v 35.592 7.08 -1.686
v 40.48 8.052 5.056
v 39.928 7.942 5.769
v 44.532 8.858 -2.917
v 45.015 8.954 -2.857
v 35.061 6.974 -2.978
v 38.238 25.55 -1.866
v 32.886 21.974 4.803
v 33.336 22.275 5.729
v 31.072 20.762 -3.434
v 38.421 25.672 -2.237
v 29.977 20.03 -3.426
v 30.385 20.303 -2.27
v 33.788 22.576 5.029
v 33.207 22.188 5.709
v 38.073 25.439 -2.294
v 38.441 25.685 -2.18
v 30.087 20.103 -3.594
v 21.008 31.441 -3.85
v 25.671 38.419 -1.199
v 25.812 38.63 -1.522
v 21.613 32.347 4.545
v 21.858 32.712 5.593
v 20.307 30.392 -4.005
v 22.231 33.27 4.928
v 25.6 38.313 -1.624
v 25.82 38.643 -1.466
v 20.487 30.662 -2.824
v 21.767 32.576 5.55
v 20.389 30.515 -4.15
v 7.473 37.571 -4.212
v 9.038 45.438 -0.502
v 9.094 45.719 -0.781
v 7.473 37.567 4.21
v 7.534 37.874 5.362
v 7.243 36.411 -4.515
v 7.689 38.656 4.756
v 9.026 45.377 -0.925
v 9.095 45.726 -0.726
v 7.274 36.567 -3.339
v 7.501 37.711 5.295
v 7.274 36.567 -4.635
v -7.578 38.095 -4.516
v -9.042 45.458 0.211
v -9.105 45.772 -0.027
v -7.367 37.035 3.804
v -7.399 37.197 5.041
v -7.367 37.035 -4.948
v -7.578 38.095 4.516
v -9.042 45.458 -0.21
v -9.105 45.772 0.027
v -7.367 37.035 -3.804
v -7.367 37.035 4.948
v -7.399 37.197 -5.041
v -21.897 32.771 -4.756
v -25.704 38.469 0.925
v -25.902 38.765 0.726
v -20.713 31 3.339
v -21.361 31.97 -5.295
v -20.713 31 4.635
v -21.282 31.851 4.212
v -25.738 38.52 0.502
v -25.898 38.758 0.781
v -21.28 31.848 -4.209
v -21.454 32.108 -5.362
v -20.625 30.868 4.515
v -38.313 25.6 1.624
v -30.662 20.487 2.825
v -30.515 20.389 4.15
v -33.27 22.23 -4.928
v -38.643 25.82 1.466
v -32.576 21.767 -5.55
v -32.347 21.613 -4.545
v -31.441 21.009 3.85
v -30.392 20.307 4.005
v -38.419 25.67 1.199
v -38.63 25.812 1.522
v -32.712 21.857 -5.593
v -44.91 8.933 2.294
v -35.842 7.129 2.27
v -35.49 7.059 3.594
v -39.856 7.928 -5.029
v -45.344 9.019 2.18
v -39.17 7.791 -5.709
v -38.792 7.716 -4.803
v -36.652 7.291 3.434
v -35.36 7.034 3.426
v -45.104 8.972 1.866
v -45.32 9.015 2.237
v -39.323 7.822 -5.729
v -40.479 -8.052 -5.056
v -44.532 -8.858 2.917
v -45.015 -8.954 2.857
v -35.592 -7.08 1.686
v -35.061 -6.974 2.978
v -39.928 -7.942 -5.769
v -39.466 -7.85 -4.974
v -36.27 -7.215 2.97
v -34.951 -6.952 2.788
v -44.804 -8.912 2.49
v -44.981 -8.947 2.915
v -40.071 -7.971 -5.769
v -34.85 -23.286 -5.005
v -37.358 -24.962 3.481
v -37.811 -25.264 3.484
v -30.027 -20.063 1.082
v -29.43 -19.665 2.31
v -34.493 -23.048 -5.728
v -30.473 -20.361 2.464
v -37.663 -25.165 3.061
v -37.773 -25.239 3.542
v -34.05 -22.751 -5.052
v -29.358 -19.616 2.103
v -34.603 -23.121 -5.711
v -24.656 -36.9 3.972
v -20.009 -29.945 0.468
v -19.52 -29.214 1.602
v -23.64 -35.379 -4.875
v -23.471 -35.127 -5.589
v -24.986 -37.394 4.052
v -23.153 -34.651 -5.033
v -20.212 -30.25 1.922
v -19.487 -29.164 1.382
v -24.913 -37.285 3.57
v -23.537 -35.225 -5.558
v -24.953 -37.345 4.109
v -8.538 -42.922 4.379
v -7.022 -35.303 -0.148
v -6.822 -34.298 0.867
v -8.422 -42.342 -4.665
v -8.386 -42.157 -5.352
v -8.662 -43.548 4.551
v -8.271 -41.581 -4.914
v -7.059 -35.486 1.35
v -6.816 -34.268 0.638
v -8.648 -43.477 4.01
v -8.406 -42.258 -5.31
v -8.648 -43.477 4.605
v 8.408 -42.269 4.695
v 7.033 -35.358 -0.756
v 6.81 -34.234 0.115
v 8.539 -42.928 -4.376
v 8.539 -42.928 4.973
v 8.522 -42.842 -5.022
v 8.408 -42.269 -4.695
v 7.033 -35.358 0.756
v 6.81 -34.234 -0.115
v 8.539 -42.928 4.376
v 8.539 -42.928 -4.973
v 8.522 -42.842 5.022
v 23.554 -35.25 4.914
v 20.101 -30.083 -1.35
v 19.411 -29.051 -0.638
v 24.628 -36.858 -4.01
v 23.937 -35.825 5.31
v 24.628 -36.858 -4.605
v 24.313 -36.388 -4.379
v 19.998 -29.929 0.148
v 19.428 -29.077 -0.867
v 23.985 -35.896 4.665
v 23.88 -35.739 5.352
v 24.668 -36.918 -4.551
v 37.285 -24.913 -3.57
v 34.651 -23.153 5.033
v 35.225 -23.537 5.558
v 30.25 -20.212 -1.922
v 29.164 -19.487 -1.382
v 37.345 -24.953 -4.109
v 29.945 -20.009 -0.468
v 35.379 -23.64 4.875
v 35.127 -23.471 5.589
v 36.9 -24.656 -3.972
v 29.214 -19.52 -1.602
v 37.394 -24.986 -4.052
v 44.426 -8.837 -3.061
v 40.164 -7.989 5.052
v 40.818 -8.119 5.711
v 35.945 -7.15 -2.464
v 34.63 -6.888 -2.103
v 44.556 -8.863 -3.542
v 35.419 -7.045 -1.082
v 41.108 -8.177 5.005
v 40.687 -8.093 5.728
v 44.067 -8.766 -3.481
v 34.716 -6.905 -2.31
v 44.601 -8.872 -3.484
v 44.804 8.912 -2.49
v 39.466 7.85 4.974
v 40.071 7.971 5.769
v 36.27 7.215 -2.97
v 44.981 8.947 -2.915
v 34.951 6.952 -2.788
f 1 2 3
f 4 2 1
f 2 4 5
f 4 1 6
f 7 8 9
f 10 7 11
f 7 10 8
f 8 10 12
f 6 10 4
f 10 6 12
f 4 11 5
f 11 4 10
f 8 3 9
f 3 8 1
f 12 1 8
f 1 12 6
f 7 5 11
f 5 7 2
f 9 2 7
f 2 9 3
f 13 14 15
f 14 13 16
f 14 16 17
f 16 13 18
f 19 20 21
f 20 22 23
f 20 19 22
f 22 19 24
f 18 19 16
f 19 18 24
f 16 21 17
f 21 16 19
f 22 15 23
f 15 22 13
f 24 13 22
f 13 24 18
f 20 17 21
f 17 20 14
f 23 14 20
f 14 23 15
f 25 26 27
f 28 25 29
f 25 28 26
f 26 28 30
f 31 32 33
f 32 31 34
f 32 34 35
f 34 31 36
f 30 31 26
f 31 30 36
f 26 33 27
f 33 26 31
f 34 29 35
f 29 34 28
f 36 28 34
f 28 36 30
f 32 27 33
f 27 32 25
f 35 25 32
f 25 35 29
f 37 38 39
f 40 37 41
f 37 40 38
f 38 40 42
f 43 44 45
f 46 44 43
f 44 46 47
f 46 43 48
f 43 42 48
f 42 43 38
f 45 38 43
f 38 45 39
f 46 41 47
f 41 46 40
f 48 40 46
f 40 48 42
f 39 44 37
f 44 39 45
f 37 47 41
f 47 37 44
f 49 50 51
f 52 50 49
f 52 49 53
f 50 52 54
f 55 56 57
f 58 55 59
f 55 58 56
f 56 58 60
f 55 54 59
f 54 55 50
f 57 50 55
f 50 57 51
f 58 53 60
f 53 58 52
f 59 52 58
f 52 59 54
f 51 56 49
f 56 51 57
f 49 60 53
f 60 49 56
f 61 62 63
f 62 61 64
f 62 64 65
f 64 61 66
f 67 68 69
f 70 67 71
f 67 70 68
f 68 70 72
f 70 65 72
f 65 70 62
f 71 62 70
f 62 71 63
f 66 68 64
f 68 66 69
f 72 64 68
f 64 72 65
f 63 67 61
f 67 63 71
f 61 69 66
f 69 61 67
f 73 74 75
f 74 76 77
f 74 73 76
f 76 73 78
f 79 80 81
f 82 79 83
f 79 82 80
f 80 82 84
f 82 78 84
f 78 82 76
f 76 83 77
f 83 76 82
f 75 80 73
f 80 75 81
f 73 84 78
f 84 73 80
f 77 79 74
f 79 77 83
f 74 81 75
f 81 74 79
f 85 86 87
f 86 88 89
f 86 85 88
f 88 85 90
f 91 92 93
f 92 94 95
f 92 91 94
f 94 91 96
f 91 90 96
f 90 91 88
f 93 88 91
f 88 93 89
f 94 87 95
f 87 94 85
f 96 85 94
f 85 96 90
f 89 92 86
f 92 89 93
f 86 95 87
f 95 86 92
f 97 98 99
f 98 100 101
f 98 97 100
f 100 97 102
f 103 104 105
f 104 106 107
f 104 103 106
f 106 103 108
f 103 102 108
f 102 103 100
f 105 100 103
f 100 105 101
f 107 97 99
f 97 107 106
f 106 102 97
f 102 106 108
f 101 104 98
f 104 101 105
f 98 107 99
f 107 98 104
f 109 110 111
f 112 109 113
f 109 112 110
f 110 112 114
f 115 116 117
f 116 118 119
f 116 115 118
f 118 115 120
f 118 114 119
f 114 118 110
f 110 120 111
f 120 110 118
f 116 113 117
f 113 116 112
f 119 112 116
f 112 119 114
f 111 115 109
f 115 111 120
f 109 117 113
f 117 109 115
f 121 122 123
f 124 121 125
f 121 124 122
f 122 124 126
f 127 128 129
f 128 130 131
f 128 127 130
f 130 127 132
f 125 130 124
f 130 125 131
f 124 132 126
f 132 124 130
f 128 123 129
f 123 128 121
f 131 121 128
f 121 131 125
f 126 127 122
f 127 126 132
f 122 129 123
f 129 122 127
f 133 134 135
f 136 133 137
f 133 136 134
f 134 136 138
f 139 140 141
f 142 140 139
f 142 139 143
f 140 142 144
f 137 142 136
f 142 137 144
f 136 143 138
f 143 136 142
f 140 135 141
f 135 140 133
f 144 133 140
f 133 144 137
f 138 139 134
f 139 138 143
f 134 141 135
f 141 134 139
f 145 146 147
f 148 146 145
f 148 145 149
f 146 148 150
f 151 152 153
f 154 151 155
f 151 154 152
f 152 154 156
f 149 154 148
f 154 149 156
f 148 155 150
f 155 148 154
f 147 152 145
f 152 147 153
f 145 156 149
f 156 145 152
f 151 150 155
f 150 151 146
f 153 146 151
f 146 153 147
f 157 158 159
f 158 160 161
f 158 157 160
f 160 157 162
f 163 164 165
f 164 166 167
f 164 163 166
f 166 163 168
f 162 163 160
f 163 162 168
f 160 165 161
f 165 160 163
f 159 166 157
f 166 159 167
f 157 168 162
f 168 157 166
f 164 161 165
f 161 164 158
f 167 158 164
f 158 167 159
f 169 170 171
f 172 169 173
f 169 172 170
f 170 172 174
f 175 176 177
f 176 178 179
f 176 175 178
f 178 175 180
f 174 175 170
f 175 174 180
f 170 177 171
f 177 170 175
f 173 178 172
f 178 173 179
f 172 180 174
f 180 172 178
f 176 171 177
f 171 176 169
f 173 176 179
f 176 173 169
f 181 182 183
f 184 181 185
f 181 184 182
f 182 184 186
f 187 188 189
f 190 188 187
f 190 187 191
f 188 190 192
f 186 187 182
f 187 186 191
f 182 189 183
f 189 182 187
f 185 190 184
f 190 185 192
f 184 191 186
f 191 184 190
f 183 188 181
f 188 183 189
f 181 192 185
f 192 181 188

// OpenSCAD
module triangle(s)
{
	scale(s)
	polygon(points=[
		[-1/2, -sqrt(3)/4 + sqrt(3)/12],
		[   0, +sqrt(3)/4 + sqrt(3)/12],
		[+1/2, -sqrt(3)/4 + sqrt(3)/12],
	]);
}


thick=10;
sides=16;
radius=50;

module segment(n)
{
	translate([radius-thick,0,0])
	rotate([90,0,0])
	rotate([0,0,n*120/sides])
	linear_extrude(
		height=radius*3.1415*2/sides,
		twist=120/sides,
		center=true,
		slices=1
	)
	triangle(thick);
}

module slice()
{
	rotate([0,0,-360/sides/2]) translate([50,-5,0]) cube([100,10,20], center=true);
	rotate([0,0,+360/sides/2]) translate([50,+5,0]) cube([100,10,20], center=true);
}

//for(i=[1:sides])
for(i=[1:sides])
{
	rotate([0,0,i*360/sides]) render() difference() 
	{
		segment(i);
		slice();
	}
}


//%cylinder(r=radius,height=5);
